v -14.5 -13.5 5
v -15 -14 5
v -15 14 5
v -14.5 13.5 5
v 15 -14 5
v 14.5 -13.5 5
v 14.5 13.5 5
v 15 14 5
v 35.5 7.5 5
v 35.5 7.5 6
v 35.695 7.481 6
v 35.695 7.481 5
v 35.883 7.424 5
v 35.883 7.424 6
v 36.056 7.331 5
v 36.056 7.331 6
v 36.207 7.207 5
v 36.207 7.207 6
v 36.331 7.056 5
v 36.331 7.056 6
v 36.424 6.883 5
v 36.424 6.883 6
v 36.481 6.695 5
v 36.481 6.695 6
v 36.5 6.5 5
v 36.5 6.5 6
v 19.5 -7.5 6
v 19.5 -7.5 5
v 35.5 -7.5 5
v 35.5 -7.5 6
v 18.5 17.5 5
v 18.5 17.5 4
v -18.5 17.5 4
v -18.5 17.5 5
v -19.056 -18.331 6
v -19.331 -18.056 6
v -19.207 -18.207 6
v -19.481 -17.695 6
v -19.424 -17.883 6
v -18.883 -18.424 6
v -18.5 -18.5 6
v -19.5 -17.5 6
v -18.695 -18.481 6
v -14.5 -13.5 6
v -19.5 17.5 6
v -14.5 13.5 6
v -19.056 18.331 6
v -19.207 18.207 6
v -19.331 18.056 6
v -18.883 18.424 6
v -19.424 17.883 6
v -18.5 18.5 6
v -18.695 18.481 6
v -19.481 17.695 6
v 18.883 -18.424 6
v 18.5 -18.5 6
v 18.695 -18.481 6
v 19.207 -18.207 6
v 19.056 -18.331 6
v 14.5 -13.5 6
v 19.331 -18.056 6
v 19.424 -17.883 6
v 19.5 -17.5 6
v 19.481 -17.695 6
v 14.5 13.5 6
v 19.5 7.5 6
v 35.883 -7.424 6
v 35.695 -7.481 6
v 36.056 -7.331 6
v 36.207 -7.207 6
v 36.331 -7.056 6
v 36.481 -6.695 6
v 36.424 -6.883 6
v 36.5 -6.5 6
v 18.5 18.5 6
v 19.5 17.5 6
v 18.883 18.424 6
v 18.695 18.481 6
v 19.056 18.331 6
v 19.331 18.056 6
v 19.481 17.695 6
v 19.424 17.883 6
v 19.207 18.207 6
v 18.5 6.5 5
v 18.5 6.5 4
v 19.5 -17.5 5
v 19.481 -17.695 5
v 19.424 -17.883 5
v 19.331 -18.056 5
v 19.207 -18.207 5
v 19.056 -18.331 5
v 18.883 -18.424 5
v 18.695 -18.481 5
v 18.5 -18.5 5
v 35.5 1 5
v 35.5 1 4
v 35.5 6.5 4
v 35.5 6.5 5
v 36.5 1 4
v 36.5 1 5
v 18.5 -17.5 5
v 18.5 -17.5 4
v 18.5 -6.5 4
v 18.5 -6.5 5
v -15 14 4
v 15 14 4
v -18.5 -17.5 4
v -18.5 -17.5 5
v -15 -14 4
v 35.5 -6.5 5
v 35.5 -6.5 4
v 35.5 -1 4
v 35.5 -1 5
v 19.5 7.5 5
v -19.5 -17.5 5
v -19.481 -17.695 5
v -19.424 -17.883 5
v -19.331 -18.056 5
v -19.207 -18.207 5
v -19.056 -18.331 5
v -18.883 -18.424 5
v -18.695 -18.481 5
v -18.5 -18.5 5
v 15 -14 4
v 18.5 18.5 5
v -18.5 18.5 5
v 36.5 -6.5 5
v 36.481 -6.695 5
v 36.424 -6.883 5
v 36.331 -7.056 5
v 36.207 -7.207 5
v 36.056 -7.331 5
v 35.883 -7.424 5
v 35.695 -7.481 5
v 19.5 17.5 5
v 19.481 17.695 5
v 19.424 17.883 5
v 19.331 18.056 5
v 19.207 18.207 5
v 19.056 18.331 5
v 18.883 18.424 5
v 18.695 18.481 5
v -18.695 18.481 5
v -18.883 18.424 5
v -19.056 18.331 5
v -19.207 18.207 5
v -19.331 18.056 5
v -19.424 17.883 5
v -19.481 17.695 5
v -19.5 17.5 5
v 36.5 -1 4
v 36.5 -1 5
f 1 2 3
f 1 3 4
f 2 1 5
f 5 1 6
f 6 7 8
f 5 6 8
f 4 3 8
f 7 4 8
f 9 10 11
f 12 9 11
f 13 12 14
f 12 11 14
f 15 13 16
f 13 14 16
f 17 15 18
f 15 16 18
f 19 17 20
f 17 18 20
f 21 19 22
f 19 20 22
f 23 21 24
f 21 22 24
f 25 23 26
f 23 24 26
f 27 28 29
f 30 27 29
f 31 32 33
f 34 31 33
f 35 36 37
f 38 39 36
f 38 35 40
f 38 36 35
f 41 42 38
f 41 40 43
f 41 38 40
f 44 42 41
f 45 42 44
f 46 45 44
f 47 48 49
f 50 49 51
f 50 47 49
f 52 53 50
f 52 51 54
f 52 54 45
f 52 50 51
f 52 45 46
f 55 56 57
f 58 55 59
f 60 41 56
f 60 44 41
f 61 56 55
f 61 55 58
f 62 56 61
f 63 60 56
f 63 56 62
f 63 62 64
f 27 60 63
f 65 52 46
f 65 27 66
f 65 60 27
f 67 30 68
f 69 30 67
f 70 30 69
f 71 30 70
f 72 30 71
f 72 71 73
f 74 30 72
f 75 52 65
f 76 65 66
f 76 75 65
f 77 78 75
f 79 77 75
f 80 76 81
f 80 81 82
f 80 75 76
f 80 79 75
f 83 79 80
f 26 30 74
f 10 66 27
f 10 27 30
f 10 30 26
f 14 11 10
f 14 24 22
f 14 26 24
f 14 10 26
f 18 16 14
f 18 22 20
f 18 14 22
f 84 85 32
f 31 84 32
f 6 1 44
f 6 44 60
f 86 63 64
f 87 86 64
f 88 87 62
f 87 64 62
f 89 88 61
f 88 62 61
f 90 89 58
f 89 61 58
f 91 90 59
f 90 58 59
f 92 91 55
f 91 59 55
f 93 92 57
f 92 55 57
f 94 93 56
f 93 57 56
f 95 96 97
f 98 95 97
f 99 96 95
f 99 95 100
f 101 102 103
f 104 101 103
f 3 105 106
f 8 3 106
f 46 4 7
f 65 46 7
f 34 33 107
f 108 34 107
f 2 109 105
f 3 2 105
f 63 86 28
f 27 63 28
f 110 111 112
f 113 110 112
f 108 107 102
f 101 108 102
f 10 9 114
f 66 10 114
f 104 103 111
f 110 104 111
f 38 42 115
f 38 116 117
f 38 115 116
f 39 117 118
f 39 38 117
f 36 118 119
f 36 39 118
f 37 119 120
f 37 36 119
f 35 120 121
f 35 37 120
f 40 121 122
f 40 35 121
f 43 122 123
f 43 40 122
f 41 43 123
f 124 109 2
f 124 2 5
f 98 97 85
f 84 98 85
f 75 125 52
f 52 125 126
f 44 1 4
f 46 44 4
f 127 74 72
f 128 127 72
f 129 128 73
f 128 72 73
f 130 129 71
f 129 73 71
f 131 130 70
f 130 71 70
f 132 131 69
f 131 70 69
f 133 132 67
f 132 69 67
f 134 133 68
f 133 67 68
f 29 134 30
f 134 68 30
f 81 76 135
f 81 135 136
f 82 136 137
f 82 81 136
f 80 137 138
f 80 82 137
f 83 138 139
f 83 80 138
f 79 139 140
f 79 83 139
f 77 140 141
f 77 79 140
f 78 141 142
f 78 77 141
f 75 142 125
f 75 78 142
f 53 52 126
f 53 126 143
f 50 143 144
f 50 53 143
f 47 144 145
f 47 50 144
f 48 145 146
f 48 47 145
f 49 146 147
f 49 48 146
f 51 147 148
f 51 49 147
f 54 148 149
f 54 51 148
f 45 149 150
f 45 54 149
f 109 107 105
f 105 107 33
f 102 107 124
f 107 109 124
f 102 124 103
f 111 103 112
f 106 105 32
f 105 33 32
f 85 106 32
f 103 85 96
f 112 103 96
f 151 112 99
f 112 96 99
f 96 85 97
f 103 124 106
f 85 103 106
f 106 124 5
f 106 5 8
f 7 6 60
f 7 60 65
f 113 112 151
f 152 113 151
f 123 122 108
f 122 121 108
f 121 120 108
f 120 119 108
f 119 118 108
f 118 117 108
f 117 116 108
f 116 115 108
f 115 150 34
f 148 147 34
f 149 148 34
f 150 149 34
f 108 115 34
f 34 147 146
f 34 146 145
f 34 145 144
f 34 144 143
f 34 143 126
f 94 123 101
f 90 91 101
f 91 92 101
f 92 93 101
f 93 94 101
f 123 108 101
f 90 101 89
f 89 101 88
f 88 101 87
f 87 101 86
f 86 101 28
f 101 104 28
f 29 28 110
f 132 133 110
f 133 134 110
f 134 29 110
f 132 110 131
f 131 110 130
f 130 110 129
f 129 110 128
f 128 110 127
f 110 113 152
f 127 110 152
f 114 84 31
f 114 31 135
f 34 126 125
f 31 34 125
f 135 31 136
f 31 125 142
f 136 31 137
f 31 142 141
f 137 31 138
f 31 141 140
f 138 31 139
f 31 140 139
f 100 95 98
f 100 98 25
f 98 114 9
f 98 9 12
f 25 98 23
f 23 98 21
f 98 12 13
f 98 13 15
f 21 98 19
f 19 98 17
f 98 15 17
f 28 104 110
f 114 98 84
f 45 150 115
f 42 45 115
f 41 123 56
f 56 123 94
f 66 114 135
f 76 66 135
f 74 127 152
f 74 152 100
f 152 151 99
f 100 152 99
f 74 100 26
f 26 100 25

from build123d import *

# Parameters (mm, degrees)
PAD_DEPTH            = 5
POCKET_DEPTH         = 4
SKETCH001_W          = 30
SKETCH001_H          = 28
PAD001_DEPTH         = 5
SKETCH003_W          = 29
SKETCH003_H          = 27
POCKET001_DEPTH      = 5
SKETCH004_W          = 2
SKETCH004_H          = 2
POCKET002_DEPTH      = 4
FILLET002_R          = 1
FILLET003_R          = 1
PAD002_DEPTH         = 2
SKETCH006_W          = 29
SKETCH006_H          = 27
POCKET003_DEPTH      = 0.001
POCKET003_DEPTH_BACK = -6.001
FILLET_R             = 1


with BuildPart() as body:
    # Sketch → Pad (new body)
    with BuildSketch(Plane.XY):
        Polygon((36.5, 7.5), (19.5, 7.5), (19.5, 18.5), (-19.5, 18.5), (-19.5, -18.5), (19.5, -18.5), (19.5, -7.5), (36.5, -7.5), align=None)
    extrude(amount=PAD_DEPTH)

    # Sketch002 → Pocket (cut)
    with BuildSketch(Plane.XY.offset(1)):
        Polygon((35.5, 6.5), (18.5, 6.5), (18.5, 17.5), (-18.5, 17.5), (-18.5, -17.5), (18.5, -17.5), (18.5, -6.5), (35.5, -6.5), align=None)
    extrude(amount=POCKET_DEPTH, mode=Mode.SUBTRACT)

    # Sketch001 → Pad001 (join)
    with BuildSketch(Plane.XY):
        Rectangle(SKETCH001_W, SKETCH001_H)
    extrude(amount=PAD001_DEPTH)

    # Sketch003 → Pocket001 (cut)
    with BuildSketch(Plane.XY):
        Rectangle(SKETCH003_W, SKETCH003_H)
    extrude(amount=POCKET001_DEPTH, mode=Mode.SUBTRACT)

    # Sketch004 → Pocket002 (cut)
    with BuildSketch(Plane.XY.offset(1)):
        with Locations((35.5, 0)):
            Rectangle(SKETCH004_W, SKETCH004_H)
    extrude(amount=POCKET002_DEPTH, mode=Mode.SUBTRACT)

    # Fillet002
    fillet002_edges = [body.edges().sort_by_distance(p)[0] for p in [
        (36.5, 7.5, 2.5),
        (19.5, 18.5, 2.5),
        (-19.5, 18.5, 2.5),
    ]]
    fillet(fillet002_edges, radius=FILLET002_R)

    # Fillet003
    fillet003_edges = [body.edges().sort_by_distance(p)[0] for p in [
        (36.5, -7.5, 2.5),
        (19.5, -18.5, 2.5),
        (-19.5, -18.5, 2.5),
    ]]
    fillet(fillet003_edges, radius=FILLET003_R)


with BuildPart() as cut:
    # Sketch005 → Pad002 (new body)
    with BuildSketch(Plane.XY.offset(4)):
        Polygon((36.5, 7.5), (19.5, 7.5), (19.5, 18.5), (-19.5, 18.5), (-19.5, -18.5), (19.5, -18.5), (19.5, -7.5), (36.5, -7.5), align=None)
    extrude(amount=PAD002_DEPTH)

    # Sketch006 → Pocket003 (cut, two sides)
    with BuildSketch(Plane.XY) as pocket003_sk:
        Rectangle(SKETCH006_W, SKETCH006_H)
    extrude(amount=-POCKET003_DEPTH, mode=Mode.SUBTRACT)
    extrude(pocket003_sk.sketch, amount=-POCKET003_DEPTH_BACK, mode=Mode.SUBTRACT)

    # Fillet
    fillet_edges = [cut.edges().sort_by_distance(p)[0] for p in [
        (36.5, -7.5, 5),
        (36.5, 7.5, 5),
        (19.5, 18.5, 5),
        (19.5, -18.5, 5),
        (-19.5, -18.5, 5),
        (-19.5, 18.5, 5),
    ]]
    fillet(fillet_edges, radius=FILLET_R)

    # Cut: cut Body
    add(body.part, mode=Mode.SUBTRACT)


solid = cut.part
